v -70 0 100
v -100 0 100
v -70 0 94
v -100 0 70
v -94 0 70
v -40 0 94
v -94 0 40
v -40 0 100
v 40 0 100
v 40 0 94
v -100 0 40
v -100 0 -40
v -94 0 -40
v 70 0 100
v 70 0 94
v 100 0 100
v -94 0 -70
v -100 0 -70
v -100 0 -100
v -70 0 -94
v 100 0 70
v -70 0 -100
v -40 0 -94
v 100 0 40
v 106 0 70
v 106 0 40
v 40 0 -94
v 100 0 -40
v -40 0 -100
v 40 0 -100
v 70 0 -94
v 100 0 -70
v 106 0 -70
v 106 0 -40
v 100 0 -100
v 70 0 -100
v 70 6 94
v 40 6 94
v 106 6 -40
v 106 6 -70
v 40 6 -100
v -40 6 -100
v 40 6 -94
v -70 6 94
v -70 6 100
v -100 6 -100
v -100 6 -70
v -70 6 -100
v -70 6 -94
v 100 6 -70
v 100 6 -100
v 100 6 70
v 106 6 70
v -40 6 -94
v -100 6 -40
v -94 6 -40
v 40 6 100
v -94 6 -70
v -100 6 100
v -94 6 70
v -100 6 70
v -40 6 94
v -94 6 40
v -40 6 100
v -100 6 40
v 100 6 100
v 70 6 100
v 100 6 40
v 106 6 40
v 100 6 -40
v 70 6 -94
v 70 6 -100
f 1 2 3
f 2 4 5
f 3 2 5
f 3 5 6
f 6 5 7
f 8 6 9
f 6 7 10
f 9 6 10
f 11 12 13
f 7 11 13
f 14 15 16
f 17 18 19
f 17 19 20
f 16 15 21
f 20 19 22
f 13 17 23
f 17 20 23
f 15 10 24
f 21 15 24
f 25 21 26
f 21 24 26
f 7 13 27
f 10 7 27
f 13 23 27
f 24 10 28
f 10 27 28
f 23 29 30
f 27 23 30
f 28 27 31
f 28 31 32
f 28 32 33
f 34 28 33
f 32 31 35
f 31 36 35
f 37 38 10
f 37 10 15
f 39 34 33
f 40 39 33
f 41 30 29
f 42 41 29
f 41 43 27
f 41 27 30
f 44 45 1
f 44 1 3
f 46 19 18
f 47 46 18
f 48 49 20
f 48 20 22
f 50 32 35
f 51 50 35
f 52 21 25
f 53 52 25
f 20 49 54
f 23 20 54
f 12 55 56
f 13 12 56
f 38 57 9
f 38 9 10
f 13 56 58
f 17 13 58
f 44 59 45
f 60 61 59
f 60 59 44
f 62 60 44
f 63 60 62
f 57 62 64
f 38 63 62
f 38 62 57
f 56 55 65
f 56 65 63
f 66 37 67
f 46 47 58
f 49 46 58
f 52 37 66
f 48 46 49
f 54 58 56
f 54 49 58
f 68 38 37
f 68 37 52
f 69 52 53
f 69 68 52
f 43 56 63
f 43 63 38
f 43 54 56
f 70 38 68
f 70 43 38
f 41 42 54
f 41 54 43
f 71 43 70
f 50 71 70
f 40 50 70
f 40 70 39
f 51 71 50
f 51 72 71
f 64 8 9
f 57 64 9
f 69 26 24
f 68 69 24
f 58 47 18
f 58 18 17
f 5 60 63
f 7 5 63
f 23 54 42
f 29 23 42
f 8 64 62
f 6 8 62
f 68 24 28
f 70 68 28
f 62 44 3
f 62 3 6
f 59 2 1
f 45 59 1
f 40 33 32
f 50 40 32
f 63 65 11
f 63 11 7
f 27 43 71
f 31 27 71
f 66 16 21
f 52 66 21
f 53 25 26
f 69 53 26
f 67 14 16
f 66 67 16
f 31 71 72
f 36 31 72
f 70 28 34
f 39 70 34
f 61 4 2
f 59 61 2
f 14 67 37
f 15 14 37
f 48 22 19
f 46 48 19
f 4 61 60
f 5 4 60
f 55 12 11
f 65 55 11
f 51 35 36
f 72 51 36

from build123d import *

# Parameters (mm, degrees)
RESSALTO_EXTRUS_O1_DEPTH = 6
ESBO_O2_W                = 30
ESBO_O2_H                = 6
ESBO_O2_W_2              = 6
ESBO_O2_H_2              = 30
CORTE_EXTRUS_O1_DEPTH    = 10


with BuildPart() as part:
    # Esboço1 → Ressalto-extrusão1 (new body)
    with BuildSketch(Plane(origin=(0, 0, 0), x_dir=(1, 0, 0), z_dir=(0, 1, 0))):
        Polygon((100, 70), (100, 100), (-100, 100), (-100, -100), (100, -100), (100, -70), (106, -70), (106, -40), (100, -40), (100, 40), (106, 40), (106, 70), align=None)
    extrude(amount=RESSALTO_EXTRUS_O1_DEPTH)

    # Esboço2 → Corte-extrusão1 (cut)
    with BuildSketch(Plane(origin=(0, 6, 0), x_dir=(1, 0, 0), z_dir=(0, 1, 0))):
        with Locations((-55, -97)):
            Rectangle(ESBO_O2_W, ESBO_O2_H)
        with Locations((55, -97)):
            Rectangle(ESBO_O2_W, ESBO_O2_H)
        with Locations((-55, 97)):
            Rectangle(ESBO_O2_W, ESBO_O2_H)
        with Locations((55, 97)):
            Rectangle(ESBO_O2_W, ESBO_O2_H)
        with Locations((-97, 55)):
            Rectangle(ESBO_O2_W_2, ESBO_O2_H_2)
        with Locations((-97, -55)):
            Rectangle(ESBO_O2_W_2, ESBO_O2_H_2)
    extrude(amount=-CORTE_EXTRUS_O1_DEPTH, mode=Mode.SUBTRACT)


solid = part.part
